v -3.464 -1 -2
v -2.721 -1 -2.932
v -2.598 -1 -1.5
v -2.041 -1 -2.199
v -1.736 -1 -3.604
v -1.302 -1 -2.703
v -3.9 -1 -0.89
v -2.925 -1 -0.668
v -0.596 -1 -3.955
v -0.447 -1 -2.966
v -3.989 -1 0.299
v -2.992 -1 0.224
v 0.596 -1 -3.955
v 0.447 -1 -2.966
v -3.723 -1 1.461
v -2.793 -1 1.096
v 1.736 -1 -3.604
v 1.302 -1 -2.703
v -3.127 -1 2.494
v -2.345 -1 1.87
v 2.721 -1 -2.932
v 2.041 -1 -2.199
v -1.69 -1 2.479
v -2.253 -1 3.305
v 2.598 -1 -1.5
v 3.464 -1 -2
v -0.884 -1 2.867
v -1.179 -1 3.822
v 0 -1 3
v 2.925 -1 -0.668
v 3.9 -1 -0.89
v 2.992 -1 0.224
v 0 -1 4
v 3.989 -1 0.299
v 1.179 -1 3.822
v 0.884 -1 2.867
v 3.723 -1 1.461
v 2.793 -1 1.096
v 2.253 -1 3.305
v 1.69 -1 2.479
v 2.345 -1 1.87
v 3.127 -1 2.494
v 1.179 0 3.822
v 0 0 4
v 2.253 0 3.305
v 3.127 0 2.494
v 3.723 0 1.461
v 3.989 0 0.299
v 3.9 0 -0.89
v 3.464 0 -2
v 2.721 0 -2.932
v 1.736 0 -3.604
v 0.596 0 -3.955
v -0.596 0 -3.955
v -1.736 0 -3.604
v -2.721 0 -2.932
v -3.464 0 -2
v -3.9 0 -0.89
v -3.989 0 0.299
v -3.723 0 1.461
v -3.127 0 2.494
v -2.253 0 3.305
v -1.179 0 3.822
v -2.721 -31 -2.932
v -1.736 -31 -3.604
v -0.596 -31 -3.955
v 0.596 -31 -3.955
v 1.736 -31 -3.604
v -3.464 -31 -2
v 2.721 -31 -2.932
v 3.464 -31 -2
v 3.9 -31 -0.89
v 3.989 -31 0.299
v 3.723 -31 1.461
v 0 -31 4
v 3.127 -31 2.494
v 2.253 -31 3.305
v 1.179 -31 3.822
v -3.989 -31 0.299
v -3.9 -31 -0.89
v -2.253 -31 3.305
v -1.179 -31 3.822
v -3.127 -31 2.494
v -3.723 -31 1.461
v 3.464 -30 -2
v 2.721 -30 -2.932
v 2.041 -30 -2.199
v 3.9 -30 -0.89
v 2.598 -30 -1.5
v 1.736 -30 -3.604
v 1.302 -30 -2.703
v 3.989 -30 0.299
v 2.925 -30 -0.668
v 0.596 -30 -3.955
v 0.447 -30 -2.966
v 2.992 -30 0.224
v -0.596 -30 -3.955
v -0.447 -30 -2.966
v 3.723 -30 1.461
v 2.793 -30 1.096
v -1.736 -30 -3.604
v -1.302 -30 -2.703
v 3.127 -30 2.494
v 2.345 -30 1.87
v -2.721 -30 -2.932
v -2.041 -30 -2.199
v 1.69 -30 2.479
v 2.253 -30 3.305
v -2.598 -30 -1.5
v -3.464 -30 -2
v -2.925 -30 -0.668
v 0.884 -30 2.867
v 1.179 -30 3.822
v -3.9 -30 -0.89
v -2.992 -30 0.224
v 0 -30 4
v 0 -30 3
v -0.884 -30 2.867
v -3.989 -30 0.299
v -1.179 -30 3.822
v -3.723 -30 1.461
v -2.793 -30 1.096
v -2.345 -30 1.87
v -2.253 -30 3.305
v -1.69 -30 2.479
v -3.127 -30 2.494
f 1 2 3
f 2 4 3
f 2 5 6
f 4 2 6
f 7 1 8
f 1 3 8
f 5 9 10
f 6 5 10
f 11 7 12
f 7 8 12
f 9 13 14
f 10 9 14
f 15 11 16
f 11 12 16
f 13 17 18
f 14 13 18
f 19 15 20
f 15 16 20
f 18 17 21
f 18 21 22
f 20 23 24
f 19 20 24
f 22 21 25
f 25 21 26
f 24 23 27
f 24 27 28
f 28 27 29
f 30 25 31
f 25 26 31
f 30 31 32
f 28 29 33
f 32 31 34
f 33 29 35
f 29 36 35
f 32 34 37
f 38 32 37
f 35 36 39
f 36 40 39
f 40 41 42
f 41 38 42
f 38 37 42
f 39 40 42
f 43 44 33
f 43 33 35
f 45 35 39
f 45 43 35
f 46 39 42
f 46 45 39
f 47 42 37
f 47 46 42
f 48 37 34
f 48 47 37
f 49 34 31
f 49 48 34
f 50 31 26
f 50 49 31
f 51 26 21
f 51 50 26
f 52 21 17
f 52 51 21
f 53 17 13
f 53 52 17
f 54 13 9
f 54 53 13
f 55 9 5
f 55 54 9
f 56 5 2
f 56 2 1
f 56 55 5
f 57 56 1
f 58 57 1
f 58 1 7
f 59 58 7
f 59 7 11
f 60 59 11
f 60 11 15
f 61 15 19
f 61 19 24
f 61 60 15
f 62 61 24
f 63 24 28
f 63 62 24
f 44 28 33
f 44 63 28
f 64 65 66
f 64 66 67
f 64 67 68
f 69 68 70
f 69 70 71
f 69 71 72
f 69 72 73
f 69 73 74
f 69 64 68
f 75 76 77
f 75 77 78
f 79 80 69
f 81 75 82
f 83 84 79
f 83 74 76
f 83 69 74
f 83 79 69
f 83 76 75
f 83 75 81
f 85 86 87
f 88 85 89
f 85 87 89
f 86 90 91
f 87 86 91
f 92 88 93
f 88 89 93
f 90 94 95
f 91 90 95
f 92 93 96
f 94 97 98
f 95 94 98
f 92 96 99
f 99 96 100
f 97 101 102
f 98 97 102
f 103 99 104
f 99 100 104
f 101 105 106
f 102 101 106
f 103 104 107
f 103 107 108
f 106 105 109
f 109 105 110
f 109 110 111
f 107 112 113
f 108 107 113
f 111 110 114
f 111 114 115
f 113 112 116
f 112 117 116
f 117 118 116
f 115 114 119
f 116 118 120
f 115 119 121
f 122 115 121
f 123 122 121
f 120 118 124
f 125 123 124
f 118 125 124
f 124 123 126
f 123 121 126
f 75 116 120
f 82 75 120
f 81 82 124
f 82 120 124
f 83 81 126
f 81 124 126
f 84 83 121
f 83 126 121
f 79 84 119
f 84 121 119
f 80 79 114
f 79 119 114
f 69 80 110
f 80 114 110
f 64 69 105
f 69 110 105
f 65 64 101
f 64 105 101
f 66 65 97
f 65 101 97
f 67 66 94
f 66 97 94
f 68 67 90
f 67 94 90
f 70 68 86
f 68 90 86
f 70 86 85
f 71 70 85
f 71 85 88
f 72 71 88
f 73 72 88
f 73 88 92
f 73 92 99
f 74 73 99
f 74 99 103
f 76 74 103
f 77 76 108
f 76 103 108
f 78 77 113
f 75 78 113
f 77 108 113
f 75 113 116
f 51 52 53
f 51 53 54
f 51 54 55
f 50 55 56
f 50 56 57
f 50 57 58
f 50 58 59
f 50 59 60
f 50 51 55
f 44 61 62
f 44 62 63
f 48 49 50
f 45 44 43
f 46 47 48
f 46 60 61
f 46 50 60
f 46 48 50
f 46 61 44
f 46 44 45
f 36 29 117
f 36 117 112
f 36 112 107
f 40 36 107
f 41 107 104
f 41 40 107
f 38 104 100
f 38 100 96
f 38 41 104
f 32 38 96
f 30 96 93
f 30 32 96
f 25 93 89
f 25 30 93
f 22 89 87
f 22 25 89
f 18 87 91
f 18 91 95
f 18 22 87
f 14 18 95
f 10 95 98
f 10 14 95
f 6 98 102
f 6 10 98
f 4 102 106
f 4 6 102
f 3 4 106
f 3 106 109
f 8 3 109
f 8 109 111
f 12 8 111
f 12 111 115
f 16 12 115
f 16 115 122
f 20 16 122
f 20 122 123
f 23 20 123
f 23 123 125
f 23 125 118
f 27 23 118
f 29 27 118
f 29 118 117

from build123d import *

# Parameters (mm, degrees)
SKETCH1_R           = 3
BOSS_EXTRUDE1_DEPTH = 30
SKETCH2_R           = 4
BOSS_EXTRUDE2_DEPTH = 1
SKETCH3_R           = 4
BOSS_EXTRUDE3_DEPTH = 1


with BuildPart() as part:
    # Sketch1 → Boss-Extrude1 (new body)
    with BuildSketch(Plane(origin=(0, 0, 0), x_dir=(1, 0, 0), z_dir=(0, 1, 0))):
        with Locations(Location((0, 0, 0), (0, 0, 270))):
            Circle(SKETCH1_R)
    extrude(amount=-BOSS_EXTRUDE1_DEPTH)

    # Sketch2 → Boss-Extrude2 (add)
    with BuildSketch(Plane(origin=(0, 0, 0), x_dir=(1, 0, 0), z_dir=(0, 1, 0))):
        with Locations(Location((0, 0, 0), (0, 0, 270))):
            Circle(SKETCH2_R)
    extrude(amount=-BOSS_EXTRUDE2_DEPTH)

    # Sketch3 → Boss-Extrude3 (add)
    with BuildSketch(Plane.XZ.offset(30)):
        with Locations(Location((0, 0, 0), (0, 0, 90))):
            Circle(SKETCH3_R)
    extrude(amount=BOSS_EXTRUDE3_DEPTH)


solid = part.part
